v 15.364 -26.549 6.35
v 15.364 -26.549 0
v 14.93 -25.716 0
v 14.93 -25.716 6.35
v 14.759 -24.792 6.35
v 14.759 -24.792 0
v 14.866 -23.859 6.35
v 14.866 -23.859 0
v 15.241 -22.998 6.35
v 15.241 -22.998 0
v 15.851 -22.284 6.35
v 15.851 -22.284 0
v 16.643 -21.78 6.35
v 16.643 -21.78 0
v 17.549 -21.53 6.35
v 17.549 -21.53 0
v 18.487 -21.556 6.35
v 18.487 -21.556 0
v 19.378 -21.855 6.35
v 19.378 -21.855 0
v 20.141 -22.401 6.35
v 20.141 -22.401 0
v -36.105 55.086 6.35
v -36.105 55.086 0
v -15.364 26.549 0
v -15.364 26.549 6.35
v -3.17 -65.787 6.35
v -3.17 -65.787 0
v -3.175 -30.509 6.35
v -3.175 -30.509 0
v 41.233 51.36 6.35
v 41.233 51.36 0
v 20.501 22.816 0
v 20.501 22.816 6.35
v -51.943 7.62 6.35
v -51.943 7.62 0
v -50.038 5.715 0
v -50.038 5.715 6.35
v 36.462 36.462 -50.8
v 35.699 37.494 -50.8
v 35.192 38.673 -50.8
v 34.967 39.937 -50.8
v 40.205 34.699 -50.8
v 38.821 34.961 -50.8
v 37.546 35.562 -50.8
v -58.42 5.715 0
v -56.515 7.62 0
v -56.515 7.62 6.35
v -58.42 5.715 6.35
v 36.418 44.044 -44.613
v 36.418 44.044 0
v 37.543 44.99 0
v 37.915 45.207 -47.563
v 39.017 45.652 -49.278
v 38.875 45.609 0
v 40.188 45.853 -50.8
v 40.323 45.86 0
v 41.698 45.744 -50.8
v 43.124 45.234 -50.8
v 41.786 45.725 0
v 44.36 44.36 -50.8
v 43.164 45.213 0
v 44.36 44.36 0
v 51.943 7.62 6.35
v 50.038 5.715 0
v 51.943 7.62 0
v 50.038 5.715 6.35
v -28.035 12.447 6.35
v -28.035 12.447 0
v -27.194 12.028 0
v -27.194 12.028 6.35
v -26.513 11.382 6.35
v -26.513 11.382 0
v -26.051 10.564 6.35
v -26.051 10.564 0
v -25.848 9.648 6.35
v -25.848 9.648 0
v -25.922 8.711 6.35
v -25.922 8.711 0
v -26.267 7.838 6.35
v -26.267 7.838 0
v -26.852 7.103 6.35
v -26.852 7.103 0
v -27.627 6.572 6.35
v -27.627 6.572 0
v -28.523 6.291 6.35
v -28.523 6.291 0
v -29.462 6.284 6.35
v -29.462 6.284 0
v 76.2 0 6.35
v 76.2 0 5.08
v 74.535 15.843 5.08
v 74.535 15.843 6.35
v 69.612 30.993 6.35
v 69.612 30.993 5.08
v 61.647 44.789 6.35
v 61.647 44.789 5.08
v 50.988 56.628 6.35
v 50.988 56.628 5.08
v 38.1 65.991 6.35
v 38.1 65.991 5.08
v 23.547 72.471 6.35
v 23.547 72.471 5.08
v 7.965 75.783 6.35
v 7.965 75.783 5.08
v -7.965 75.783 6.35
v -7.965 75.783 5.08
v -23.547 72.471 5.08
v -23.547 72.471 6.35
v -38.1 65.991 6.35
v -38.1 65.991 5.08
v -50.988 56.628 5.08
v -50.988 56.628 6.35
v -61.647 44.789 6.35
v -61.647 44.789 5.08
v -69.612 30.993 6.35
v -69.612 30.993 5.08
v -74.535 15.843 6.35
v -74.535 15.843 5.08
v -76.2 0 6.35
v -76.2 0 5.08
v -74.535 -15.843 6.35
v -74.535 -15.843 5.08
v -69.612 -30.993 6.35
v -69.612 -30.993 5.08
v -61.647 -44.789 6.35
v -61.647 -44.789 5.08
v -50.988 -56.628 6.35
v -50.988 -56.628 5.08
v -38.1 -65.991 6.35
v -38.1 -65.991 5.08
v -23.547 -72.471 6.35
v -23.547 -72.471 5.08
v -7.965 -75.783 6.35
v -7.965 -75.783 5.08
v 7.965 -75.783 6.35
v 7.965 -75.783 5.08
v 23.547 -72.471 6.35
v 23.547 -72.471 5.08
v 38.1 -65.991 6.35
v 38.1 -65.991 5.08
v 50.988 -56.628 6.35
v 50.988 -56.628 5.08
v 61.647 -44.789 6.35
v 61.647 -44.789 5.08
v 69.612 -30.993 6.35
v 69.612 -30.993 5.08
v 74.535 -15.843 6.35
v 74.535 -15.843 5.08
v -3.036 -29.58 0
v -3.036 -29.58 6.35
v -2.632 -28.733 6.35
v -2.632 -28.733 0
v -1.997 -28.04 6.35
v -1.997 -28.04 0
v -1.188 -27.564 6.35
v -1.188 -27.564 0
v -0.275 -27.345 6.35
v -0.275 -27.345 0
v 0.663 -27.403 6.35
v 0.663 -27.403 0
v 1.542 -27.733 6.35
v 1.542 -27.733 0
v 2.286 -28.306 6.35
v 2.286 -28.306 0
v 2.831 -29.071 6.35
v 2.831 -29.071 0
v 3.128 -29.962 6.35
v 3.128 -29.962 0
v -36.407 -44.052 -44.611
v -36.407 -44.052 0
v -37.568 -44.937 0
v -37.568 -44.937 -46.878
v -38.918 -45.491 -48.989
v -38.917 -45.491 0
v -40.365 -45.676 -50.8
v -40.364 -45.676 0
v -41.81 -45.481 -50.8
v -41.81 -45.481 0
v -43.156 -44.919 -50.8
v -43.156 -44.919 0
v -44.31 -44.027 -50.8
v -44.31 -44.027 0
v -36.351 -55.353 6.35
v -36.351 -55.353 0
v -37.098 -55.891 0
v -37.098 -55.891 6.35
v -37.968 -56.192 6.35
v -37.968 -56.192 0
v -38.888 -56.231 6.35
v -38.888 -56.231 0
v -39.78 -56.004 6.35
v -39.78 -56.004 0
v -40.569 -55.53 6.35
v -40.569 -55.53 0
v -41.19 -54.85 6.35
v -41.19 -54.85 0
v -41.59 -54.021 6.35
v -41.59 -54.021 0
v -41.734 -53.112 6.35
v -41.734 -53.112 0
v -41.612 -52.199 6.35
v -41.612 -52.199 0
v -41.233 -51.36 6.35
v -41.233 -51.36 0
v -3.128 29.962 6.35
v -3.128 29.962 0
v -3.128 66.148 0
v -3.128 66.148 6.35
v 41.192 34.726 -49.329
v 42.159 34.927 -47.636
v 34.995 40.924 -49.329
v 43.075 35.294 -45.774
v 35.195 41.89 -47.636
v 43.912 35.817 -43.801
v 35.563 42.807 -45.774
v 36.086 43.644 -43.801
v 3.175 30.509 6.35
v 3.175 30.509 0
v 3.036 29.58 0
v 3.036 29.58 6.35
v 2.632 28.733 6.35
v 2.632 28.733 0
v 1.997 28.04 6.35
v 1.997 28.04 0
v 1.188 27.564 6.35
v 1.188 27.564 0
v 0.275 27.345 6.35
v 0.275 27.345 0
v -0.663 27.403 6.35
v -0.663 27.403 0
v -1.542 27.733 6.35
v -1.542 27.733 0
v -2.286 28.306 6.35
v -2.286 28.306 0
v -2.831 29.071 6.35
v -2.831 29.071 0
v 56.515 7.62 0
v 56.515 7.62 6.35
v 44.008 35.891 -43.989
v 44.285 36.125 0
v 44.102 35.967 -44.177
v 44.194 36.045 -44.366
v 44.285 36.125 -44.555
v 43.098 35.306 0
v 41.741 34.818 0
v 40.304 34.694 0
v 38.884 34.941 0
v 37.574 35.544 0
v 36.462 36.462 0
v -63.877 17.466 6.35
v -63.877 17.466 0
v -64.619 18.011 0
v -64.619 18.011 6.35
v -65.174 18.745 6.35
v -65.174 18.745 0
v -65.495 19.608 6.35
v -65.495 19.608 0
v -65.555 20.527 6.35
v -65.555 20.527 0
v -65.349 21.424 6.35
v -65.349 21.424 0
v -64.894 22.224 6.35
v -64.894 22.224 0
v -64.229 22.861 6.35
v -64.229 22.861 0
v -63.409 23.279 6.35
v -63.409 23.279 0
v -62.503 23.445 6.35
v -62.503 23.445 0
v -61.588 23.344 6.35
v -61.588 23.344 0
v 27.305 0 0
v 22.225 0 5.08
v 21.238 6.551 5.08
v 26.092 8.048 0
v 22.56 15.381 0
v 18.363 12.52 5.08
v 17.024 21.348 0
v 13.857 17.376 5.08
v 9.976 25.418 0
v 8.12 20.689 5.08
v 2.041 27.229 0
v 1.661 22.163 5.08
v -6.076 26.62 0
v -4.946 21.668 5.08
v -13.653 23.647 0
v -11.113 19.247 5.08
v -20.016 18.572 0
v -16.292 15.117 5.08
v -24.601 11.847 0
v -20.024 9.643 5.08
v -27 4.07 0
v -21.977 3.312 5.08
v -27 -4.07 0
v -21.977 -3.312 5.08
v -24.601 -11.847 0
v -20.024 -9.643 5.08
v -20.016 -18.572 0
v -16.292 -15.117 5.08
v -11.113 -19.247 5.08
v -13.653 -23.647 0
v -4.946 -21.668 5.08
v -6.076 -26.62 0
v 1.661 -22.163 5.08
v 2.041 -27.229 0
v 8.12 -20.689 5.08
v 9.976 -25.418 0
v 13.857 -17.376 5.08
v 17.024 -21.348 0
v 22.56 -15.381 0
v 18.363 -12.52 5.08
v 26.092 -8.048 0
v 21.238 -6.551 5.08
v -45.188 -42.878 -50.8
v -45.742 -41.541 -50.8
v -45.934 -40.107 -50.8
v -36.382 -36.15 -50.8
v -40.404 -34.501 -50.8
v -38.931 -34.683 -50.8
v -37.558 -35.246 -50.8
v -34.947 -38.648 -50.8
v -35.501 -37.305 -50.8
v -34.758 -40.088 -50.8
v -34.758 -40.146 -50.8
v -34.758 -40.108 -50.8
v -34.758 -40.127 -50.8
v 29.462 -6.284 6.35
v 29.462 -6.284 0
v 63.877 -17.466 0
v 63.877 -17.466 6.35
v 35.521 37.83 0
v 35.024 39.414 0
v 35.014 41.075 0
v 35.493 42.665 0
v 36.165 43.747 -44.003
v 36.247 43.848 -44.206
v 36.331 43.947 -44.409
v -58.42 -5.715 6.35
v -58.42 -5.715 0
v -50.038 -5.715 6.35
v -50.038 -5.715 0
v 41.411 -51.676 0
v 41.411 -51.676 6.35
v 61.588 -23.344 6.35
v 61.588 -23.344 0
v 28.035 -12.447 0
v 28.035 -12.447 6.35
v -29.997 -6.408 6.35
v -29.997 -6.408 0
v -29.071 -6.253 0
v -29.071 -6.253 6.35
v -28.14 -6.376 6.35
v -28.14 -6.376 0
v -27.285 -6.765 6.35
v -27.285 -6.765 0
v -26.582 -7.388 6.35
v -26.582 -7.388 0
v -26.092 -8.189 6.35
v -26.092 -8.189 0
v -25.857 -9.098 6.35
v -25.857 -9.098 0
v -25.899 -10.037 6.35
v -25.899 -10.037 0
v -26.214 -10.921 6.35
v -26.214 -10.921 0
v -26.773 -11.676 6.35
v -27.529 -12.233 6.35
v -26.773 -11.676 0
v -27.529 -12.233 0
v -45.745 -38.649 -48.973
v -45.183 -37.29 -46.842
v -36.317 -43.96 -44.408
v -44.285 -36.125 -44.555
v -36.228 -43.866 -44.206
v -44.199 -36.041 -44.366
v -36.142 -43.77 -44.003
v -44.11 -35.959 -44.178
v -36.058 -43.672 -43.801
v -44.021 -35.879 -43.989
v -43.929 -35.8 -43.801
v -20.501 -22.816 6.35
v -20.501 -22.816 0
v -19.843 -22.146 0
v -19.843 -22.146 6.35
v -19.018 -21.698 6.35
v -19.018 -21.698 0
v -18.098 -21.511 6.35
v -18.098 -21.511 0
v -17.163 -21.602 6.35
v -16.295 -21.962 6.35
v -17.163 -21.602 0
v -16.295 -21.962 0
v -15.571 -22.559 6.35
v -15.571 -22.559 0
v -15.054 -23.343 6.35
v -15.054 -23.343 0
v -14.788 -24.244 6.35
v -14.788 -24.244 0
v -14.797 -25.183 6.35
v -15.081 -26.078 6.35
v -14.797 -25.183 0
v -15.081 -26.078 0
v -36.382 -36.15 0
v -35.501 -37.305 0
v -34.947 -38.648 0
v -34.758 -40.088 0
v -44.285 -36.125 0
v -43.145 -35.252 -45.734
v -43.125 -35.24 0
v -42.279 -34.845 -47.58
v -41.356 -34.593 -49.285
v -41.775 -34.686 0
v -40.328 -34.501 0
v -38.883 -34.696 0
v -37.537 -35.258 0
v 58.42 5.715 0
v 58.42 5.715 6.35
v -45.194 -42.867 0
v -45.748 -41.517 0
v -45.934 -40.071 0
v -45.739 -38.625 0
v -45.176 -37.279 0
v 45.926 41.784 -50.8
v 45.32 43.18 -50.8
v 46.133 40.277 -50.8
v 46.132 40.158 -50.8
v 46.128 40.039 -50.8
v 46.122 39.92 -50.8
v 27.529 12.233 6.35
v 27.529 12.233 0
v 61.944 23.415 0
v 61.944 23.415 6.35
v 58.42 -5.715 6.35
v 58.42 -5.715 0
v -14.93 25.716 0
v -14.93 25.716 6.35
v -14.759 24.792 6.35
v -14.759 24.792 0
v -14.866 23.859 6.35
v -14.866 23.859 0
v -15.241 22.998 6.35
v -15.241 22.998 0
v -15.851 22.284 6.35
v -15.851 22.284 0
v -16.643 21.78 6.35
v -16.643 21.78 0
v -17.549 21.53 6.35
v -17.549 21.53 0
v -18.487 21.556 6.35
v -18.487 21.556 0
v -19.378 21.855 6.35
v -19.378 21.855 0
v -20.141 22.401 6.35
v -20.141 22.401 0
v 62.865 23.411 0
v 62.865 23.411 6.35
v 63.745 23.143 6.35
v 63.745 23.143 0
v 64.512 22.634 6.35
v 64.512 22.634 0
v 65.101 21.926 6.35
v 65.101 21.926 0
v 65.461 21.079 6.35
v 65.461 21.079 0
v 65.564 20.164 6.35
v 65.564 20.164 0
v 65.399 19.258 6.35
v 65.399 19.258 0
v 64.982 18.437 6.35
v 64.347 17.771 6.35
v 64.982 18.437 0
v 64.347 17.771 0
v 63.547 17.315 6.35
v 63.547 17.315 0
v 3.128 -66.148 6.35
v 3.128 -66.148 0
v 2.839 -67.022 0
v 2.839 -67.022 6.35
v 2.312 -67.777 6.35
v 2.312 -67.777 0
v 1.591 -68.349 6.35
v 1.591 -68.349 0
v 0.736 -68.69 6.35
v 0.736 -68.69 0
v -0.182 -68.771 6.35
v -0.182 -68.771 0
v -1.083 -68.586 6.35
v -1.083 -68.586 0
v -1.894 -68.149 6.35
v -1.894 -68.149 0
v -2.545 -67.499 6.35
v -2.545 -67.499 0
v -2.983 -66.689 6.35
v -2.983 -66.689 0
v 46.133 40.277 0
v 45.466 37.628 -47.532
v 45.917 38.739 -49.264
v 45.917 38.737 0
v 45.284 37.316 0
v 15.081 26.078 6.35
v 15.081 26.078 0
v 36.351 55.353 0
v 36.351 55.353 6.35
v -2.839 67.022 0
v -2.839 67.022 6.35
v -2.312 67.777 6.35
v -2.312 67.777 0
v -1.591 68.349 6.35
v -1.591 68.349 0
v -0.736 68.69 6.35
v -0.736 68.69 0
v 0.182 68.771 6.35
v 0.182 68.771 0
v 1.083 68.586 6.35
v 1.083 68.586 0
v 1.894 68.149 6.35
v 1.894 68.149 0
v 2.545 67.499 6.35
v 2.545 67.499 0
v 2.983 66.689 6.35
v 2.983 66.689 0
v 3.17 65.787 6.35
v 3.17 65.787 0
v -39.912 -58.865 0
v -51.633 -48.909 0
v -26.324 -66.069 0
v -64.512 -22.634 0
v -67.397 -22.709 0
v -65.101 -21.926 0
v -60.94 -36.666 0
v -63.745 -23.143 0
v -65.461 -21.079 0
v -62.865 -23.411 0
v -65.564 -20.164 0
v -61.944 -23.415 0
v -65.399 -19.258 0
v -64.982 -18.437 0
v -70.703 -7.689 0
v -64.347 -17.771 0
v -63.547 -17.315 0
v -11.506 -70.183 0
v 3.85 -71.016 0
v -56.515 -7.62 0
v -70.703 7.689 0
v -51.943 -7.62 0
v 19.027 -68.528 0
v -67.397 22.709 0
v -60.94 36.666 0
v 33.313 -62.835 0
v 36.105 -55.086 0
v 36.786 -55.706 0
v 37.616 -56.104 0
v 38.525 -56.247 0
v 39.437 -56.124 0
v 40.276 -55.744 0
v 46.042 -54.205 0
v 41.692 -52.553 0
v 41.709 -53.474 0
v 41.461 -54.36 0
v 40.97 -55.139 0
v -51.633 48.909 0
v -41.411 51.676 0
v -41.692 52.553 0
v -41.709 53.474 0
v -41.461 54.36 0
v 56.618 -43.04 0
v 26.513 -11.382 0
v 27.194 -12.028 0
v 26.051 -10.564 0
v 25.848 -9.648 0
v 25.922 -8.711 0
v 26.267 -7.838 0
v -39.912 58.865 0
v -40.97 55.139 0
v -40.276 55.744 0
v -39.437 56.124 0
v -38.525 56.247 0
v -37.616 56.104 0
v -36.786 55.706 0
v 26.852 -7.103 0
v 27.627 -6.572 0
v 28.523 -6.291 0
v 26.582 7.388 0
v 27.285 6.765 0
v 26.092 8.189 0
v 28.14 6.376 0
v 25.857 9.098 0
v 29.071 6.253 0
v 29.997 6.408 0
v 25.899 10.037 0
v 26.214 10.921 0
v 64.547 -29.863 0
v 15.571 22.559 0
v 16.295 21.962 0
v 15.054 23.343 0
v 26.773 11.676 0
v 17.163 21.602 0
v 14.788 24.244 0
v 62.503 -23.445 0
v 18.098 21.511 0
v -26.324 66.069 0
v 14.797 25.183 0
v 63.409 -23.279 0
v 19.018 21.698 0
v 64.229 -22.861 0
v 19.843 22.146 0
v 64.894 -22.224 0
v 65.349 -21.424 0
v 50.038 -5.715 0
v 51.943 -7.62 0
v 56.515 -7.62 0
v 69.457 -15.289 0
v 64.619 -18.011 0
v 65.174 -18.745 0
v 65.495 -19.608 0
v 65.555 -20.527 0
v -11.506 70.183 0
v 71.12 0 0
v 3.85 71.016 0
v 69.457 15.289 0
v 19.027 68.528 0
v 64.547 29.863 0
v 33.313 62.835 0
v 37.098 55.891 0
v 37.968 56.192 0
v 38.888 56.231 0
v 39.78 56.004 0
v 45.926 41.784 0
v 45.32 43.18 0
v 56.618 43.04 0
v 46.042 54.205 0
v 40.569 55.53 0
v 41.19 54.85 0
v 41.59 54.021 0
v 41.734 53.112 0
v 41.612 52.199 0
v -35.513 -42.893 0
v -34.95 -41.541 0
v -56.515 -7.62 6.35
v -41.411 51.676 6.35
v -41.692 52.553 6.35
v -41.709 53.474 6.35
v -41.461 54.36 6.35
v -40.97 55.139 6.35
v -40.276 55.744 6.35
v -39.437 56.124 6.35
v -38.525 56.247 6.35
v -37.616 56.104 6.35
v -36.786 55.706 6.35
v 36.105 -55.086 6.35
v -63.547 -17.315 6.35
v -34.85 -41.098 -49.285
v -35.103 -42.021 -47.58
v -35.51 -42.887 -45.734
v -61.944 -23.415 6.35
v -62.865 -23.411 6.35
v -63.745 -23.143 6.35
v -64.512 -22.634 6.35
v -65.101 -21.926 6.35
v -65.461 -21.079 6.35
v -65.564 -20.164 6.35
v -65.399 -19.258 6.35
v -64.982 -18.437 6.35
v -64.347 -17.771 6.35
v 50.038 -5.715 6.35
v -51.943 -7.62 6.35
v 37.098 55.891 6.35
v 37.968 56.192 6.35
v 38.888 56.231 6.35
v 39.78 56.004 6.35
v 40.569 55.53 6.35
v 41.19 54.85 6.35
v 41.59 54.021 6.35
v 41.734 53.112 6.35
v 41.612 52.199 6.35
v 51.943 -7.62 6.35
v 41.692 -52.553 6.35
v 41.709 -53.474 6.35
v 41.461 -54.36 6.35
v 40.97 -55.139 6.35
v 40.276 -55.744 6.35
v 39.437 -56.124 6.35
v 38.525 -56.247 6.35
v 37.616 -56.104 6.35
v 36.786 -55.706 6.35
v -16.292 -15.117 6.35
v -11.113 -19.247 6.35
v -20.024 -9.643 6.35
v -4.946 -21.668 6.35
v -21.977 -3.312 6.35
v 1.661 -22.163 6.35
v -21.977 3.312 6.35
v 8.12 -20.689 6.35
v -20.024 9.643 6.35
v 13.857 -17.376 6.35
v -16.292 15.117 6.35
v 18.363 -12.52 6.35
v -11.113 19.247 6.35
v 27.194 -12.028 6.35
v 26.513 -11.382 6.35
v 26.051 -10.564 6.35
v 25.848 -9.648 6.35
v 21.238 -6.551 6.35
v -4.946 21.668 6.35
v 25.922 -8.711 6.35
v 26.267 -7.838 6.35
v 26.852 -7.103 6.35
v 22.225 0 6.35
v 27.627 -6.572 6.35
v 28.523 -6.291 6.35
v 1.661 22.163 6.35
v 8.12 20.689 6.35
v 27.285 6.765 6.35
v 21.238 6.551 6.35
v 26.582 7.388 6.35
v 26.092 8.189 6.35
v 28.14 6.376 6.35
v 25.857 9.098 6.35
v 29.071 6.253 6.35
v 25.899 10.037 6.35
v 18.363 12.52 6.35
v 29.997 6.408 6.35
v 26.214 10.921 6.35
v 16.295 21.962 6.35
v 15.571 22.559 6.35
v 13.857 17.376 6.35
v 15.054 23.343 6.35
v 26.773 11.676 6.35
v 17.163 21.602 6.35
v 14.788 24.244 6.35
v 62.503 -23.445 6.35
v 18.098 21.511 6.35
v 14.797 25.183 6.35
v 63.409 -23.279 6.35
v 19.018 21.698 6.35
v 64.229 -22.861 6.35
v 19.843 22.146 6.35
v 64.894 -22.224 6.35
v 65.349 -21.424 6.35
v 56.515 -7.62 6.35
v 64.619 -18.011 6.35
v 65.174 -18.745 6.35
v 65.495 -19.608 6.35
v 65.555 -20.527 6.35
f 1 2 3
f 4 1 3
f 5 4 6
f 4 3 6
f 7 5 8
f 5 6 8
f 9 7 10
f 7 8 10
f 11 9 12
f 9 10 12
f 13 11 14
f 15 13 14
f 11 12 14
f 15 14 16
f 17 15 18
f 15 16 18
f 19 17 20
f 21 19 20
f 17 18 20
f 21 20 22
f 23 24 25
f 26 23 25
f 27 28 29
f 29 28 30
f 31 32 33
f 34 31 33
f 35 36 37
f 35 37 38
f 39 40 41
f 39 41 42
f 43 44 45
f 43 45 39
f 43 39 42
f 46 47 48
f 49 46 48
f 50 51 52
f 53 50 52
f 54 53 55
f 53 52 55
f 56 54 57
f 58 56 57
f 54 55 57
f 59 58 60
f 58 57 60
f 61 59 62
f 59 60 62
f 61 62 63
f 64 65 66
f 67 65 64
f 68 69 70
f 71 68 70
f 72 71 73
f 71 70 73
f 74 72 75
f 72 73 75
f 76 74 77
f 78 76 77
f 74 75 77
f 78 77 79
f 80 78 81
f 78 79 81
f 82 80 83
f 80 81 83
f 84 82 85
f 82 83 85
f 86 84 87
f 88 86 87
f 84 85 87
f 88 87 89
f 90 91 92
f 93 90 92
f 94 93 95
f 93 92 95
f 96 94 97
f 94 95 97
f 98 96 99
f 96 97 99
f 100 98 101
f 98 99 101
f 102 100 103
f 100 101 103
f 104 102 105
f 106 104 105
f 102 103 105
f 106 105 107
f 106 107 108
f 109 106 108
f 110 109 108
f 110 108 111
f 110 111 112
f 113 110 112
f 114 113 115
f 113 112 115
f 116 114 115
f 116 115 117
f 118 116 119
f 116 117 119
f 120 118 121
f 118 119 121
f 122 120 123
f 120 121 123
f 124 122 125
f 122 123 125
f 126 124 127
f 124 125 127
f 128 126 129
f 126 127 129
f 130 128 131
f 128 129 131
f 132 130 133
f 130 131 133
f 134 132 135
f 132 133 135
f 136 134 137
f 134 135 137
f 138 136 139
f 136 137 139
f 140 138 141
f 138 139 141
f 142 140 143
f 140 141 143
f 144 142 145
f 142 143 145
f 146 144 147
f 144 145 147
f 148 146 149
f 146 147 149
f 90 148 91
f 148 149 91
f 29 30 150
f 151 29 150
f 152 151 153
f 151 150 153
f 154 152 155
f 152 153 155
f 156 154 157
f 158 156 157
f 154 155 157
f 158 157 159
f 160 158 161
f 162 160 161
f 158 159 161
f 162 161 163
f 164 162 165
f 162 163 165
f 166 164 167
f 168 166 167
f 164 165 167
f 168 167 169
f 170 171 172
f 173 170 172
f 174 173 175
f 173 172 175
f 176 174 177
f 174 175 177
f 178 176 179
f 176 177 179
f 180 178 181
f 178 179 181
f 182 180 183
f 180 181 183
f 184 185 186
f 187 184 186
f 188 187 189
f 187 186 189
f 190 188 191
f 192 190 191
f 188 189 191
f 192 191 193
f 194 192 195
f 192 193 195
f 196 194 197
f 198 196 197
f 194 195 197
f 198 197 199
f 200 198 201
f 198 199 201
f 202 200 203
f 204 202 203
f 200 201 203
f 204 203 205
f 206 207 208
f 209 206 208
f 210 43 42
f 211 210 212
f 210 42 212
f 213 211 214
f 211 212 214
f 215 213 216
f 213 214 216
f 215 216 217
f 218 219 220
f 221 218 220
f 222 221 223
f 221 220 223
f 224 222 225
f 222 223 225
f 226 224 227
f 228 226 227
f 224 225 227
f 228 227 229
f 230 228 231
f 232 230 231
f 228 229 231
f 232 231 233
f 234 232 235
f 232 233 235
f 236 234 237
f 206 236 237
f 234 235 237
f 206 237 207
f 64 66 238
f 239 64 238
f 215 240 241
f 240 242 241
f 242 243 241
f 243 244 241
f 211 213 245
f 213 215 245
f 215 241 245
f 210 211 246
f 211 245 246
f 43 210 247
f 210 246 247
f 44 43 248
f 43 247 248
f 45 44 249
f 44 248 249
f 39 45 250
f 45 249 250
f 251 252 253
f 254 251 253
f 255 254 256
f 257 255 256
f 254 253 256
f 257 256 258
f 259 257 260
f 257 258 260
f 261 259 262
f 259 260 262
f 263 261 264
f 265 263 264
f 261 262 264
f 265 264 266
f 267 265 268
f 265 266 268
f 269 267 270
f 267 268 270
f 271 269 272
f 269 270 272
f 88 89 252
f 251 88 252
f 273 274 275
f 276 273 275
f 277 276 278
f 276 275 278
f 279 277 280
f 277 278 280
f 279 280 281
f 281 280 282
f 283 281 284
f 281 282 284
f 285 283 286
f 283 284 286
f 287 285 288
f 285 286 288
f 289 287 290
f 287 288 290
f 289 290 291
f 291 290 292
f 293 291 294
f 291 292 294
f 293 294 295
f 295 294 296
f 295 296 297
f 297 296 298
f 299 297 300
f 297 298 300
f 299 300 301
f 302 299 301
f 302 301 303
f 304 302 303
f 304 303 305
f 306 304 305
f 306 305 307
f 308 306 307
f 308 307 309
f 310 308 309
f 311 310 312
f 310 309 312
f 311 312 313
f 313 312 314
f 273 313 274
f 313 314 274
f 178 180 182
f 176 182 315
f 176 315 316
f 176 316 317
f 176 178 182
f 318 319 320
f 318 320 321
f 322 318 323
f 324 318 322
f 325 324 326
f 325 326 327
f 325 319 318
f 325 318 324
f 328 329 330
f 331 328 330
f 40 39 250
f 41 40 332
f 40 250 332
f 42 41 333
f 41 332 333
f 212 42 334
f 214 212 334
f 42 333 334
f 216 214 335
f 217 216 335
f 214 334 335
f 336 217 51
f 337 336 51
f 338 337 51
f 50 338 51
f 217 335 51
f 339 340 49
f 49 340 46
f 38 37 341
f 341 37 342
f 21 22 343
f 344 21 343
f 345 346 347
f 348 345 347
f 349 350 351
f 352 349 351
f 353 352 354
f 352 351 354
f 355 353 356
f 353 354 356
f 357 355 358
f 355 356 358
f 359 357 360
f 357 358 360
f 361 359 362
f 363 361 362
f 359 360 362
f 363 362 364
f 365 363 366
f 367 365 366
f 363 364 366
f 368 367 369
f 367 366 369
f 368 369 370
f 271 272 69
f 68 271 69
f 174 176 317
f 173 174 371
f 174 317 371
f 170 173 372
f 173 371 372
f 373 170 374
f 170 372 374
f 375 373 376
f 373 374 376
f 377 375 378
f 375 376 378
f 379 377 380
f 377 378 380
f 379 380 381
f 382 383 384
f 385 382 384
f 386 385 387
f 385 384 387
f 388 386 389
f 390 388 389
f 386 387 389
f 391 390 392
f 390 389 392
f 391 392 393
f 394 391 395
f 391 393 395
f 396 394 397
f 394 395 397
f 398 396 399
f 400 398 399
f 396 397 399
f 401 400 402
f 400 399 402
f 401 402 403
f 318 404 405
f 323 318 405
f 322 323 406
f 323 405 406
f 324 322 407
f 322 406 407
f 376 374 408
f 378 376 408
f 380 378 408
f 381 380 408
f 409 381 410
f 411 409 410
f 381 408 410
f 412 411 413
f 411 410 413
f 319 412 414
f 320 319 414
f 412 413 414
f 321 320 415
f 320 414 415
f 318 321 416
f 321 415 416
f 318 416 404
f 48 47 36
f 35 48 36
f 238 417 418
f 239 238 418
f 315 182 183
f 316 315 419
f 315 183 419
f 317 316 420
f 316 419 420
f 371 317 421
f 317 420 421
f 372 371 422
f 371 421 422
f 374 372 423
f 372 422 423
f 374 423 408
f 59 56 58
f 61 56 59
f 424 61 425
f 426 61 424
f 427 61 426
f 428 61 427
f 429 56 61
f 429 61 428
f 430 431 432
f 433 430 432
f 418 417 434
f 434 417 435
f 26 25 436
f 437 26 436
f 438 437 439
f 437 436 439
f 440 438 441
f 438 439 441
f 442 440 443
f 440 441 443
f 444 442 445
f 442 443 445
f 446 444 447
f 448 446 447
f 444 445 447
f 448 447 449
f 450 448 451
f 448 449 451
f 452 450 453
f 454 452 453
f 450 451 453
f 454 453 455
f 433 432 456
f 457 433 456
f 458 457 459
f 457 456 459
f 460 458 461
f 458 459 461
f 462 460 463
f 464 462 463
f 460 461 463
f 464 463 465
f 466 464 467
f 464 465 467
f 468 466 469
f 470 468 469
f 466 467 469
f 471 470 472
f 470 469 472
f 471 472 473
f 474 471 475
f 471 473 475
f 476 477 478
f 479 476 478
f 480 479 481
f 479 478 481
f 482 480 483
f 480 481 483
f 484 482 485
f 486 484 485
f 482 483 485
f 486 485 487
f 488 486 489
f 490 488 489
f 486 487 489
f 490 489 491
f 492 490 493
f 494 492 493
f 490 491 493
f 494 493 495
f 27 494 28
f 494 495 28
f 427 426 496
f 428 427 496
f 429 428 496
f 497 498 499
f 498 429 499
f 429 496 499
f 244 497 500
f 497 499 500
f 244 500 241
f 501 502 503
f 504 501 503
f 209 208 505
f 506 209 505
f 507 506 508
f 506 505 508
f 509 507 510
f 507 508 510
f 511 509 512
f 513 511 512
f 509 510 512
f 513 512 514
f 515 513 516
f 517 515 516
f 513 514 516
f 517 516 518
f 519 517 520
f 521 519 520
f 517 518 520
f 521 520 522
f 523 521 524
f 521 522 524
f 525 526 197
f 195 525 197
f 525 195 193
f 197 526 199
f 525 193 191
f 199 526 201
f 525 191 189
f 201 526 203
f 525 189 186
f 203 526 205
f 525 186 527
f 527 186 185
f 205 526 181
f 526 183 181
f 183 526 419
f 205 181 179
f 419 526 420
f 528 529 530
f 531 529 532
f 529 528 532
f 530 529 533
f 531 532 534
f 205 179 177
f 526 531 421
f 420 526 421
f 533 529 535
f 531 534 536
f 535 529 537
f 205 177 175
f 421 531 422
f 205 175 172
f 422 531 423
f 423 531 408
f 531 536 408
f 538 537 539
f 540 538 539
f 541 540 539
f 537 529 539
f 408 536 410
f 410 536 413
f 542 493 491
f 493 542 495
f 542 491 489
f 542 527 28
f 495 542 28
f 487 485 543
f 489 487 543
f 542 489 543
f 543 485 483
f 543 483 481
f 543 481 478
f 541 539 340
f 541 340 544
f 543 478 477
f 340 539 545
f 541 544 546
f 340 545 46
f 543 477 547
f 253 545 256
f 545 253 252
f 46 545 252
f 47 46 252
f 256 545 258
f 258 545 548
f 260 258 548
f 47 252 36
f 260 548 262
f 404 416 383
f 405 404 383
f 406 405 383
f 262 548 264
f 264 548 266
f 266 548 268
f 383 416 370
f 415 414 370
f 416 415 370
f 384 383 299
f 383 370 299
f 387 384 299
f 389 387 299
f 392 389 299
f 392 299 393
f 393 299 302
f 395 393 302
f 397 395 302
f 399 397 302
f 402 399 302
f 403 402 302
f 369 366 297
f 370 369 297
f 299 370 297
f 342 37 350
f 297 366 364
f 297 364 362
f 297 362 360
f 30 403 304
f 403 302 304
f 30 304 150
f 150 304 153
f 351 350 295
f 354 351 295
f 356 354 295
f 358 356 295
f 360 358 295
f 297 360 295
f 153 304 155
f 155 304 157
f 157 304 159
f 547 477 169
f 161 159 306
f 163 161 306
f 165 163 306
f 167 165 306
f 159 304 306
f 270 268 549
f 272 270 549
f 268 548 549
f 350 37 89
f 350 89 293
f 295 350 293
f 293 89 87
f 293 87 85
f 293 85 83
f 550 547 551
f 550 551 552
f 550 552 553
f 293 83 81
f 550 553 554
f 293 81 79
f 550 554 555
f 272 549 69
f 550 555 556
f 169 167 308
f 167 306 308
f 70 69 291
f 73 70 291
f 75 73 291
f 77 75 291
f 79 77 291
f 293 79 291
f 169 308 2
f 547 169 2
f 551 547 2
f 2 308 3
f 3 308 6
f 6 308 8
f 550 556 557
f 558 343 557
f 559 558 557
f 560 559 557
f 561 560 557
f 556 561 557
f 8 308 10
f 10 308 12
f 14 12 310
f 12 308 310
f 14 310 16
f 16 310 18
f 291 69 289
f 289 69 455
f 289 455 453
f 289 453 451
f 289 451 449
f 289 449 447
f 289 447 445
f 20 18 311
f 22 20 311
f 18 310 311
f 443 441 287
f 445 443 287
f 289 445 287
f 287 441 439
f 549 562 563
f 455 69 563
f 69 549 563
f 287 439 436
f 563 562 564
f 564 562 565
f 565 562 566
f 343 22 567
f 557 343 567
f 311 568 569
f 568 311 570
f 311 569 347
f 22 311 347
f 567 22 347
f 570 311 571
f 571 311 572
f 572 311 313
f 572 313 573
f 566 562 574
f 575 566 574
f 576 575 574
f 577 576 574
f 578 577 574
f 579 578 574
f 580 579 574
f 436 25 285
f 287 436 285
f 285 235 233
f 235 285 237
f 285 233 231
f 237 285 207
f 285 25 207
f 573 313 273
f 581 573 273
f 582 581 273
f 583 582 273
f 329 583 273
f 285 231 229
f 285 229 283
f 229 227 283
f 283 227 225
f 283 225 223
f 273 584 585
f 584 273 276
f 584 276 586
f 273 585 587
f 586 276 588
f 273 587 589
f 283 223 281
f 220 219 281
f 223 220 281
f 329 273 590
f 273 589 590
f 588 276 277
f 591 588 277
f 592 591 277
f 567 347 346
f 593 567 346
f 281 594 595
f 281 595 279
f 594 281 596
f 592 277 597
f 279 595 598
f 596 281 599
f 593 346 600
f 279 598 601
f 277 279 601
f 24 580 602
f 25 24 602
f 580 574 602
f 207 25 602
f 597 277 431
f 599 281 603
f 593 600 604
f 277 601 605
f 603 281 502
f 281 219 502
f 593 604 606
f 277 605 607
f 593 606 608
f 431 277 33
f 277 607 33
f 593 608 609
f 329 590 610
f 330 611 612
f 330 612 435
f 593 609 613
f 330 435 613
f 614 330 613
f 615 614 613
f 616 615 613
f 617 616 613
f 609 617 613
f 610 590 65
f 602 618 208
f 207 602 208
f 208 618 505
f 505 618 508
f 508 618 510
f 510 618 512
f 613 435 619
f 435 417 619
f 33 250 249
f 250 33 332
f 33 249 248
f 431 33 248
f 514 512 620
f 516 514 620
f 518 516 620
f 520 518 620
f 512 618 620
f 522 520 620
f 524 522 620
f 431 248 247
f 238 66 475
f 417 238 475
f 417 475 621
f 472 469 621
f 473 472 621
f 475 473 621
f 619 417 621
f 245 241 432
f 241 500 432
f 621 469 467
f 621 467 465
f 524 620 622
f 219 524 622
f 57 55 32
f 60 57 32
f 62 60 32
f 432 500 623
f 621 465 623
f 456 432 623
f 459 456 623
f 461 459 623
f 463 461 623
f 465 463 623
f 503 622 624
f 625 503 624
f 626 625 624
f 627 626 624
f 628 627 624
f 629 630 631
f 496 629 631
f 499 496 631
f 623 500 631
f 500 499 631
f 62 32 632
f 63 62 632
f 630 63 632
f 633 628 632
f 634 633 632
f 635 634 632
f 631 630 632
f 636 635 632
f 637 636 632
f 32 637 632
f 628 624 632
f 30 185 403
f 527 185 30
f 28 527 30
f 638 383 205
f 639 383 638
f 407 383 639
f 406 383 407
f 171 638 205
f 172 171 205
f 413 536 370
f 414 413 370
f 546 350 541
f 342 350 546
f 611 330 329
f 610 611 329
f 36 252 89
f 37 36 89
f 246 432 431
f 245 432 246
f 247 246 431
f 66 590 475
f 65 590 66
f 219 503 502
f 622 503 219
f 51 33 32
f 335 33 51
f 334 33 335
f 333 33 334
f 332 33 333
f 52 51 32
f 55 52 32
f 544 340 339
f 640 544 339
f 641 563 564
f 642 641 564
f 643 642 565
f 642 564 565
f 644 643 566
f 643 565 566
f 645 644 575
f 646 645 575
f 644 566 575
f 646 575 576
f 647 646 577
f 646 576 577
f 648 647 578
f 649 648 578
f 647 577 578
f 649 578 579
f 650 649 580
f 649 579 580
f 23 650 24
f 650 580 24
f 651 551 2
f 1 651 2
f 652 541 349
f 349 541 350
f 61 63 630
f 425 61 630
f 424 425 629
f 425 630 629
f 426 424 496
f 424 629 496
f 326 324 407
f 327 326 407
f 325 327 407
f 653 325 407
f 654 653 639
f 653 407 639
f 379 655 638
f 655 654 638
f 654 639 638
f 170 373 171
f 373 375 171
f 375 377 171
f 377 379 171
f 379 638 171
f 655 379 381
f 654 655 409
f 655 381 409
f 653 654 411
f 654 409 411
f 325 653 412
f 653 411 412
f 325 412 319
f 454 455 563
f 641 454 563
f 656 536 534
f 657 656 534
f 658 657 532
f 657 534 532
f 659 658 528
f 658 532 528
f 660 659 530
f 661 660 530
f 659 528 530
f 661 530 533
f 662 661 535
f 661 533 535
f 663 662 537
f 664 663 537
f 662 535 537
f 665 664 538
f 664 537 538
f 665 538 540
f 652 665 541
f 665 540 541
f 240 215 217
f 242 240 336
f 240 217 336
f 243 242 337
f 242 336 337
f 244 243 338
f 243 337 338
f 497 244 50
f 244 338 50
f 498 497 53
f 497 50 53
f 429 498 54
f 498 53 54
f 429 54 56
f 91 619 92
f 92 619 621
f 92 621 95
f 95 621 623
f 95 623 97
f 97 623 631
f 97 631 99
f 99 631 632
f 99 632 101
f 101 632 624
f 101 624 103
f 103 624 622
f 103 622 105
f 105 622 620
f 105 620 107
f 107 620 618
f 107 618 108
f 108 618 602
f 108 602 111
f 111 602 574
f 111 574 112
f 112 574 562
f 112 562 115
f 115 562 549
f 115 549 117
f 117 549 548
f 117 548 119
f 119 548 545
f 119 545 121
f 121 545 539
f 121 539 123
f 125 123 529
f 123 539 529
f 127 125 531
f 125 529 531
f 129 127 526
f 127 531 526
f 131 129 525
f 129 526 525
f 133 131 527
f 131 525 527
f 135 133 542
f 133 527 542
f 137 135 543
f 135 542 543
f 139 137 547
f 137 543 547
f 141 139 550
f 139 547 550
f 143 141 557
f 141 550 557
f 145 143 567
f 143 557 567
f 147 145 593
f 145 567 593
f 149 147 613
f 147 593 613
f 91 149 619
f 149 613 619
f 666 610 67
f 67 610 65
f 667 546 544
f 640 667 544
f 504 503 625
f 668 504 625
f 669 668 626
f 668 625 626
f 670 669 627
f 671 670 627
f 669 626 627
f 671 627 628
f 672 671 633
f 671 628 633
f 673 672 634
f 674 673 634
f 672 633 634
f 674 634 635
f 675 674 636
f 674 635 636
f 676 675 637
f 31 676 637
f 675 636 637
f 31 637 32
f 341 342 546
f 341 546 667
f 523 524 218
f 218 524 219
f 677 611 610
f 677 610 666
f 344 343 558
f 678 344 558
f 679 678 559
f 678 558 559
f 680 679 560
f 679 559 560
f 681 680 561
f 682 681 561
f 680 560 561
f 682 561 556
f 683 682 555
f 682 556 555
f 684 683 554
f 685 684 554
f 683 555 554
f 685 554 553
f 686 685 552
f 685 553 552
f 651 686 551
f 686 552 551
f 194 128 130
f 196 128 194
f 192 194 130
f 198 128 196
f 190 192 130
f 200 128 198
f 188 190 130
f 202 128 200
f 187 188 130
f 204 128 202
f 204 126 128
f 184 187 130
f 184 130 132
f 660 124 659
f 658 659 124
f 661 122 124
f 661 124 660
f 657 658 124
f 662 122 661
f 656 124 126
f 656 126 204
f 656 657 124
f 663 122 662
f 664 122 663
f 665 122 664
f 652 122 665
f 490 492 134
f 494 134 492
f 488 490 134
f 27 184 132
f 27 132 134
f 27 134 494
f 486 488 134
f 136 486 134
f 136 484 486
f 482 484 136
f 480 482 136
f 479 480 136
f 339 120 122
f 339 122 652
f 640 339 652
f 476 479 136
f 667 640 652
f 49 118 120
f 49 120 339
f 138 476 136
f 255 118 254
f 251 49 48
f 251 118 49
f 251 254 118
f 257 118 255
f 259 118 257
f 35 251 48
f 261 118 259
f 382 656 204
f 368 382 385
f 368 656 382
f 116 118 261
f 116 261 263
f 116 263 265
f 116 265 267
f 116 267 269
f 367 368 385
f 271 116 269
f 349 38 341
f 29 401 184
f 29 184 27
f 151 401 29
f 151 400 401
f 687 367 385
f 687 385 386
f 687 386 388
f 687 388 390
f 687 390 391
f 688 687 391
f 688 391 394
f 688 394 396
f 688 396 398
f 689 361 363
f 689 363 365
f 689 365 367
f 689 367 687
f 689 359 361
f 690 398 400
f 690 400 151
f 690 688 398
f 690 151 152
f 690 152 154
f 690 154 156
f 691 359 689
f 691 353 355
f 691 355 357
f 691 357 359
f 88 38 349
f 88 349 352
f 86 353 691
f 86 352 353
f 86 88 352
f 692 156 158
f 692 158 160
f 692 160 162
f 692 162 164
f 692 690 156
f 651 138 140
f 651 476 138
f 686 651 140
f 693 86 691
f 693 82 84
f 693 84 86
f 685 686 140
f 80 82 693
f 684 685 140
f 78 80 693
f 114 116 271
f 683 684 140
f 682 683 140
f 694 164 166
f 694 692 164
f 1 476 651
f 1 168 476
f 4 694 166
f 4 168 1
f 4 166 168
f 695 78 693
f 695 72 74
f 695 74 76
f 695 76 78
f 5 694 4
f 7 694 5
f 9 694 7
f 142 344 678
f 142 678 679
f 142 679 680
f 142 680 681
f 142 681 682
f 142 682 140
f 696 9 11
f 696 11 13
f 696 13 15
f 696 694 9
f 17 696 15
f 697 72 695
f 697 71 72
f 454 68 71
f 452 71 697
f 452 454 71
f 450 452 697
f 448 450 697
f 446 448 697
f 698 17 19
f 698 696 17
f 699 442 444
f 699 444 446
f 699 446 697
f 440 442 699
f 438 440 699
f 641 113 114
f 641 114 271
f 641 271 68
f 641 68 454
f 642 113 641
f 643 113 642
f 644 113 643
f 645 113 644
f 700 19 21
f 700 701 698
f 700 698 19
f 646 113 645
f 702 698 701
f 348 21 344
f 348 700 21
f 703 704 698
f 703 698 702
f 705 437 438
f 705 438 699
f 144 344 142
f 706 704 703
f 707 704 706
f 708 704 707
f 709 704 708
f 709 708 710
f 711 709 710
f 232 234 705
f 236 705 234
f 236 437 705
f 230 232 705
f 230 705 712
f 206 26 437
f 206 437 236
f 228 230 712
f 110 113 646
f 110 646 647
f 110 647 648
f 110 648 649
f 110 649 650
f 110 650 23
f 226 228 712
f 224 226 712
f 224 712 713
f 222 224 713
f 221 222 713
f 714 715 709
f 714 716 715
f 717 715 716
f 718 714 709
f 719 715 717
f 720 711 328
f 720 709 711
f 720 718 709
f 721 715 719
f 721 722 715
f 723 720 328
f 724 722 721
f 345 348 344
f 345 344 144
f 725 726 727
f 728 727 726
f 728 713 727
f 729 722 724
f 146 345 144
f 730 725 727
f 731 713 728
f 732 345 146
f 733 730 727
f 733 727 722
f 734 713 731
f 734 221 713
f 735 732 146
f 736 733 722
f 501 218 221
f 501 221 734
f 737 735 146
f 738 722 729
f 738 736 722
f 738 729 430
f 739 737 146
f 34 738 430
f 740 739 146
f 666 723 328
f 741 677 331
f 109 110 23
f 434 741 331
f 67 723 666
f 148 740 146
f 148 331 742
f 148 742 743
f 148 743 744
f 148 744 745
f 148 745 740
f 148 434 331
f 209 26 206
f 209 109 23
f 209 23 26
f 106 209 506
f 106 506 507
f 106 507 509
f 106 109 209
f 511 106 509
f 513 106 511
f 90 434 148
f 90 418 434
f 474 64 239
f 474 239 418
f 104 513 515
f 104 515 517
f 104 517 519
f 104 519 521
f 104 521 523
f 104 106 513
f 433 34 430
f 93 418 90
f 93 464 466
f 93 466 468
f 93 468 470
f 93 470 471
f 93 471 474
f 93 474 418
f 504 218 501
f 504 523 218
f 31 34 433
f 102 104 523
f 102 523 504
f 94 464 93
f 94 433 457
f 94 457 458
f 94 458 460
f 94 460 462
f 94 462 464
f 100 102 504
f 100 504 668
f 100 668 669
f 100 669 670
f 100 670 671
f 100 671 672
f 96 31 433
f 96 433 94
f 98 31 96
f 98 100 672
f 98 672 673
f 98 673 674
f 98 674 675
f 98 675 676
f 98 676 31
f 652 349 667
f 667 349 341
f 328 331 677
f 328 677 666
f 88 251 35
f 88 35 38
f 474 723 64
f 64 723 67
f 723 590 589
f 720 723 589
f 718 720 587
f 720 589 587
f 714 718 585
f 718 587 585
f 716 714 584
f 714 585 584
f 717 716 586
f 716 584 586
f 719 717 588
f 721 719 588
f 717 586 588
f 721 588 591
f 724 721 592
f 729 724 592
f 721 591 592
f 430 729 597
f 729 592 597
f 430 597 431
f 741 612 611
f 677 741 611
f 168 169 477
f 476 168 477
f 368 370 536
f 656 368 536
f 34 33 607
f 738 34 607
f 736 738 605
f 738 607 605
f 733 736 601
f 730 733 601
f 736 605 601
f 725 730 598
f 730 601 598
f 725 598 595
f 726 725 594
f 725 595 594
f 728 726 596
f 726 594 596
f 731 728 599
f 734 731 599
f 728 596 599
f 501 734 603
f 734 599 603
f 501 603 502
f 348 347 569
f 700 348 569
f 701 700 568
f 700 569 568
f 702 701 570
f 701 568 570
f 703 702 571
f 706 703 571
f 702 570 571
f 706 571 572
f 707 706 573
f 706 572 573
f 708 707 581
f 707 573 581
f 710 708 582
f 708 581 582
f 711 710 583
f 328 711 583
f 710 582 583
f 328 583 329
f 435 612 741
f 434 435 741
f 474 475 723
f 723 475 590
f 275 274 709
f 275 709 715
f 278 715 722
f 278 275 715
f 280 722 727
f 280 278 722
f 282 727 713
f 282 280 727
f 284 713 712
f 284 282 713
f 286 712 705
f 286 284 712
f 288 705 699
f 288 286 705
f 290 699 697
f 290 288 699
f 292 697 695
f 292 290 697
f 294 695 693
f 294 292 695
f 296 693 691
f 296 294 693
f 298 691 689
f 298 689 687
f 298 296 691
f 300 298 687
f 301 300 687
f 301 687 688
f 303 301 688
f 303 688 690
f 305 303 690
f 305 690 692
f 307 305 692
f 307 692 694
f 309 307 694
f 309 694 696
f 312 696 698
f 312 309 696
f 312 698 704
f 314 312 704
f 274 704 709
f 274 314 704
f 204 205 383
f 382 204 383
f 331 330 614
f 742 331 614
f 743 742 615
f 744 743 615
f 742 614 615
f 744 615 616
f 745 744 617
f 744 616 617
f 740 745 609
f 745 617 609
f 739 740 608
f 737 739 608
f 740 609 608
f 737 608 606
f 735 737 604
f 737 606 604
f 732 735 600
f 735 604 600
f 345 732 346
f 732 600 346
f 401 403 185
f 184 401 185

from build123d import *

# Parameters (mm, degrees)
F0_R          = 22.225
F1_DEPTH      = 6.35
F2_SIZE       = 1.905
F4_DEPTH      = 50.8
F8_DEPTH      = 25.4
F8_DEPTH_BACK = 25.4
F9_SIZE       = 5.08
F10_SIZE      = 5.08


with BuildPart() as f1:
    # F0 (on Top) → F1 (new body)
    with BuildSketch(Plane.XY):
        with BuildLine():
            ThreePointArc((-76.2, 0), (0, -76.2), (76.2, 0))
            ThreePointArc((76.2, 0), (0, 76.2), (-76.2, 0))
        make_face()
        with BuildLine():
            ThreePointArc((-36.3505191374, -55.3531540115), (-40.5694607495, -55.5302656455), (-41.2330473061, -51.3600750337))
            Line((-41.2330473061, -51.3600750337), (-20.5013866713, -22.8161053906))
            ThreePointArc((-20.5013866713, -22.8161053906), (-16.2954133846, -21.961508124), (-15.0808678012, -26.0779904576))
            Line((-15.0808678012, -26.0779904576), (-36.3505191374, -55.3531540115))
        make_face(mode=Mode.SUBTRACT)
        with BuildLine():
            ThreePointArc((3.1275798593, -66.1479413497), (-0.1815119967, -68.7710593314), (-3.1695413391, -65.7873506482))
            Line((-3.1695413391, -65.7873506482), (-3.174999962, -30.5090297434))
            ThreePointArc((-3.174999962, -30.5090297434), (-0.2746157651, -27.3454369619), (3.1275798593, -29.9618491446))
            Line((3.1275798593, -29.9618491446), (3.1275798593, -66.1479413497))
        make_face(mode=Mode.SUBTRACT)
        with BuildLine():
            ThreePointArc((-61.9439553323, -23.4153432254), (-65.4612544013, -21.0787978873), (-63.546930662, -17.314996421))
            Line((-63.546930662, -17.314996421), (-29.9969404887, -6.4082042695))
            ThreePointArc((-29.9969404887, -6.4082042695), (-26.0919169519, -8.189029627), (-27.5289365415, -12.233225774))
            Line((-27.5289365415, -12.233225774), (-61.9439553323, -23.4153432254))
        make_face(mode=Mode.SUBTRACT)
        with BuildLine():
            ThreePointArc((41.4110496523, -51.6764633782), (40.2757681695, -55.743645795), (36.1046216907, -55.086094345))
            Line((36.1046216907, -55.086094345), (15.3641288185, -26.548541698))
            ThreePointArc((15.3641288185, -26.548541698), (15.8510757428, -22.2843383176), (20.1413983161, -22.4012998243))
            Line((20.1413983161, -22.4012998243), (41.4110496523, -51.6764633782))
        make_face(mode=Mode.SUBTRACT)
        with BuildLine():
            ThreePointArc((63.8769059879, -17.4663328146), (65.349073818, -21.4240542218), (61.5880463856, -23.3438223094))
            Line((61.5880463856, -23.3438223094), (28.0346825979, -12.4474130757))
            ThreePointArc((28.0346825979, -12.4474130757), (25.9221950752, -8.7113798527), (29.4618871971, -6.2842153632))
            Line((29.4618871971, -6.2842153632), (63.8769059879, -17.4663328146))
        make_face(mode=Mode.SUBTRACT)
        Polygon((-58.42, -7.62), (-58.42, 0), (-58.42, 7.62), (-50.038, 7.62), (-50.038, -7.62), align=None, mode=Mode.SUBTRACT)
        with BuildLine():
            ThreePointArc((-63.8769059879, 17.4663328146), (-65.349073818, 21.4240542218), (-61.5880463856, 23.3438223094))
            Line((-61.5880463856, 23.3438223094), (-28.0346825979, 12.4474130757))
            ThreePointArc((-28.0346825979, 12.4474130757), (-25.9221950752, 8.7113798527), (-29.4618871971, 6.2842153632))
            Line((-29.4618871971, 6.2842153632), (-63.8769059879, 17.4663328146))
        make_face(mode=Mode.SUBTRACT)
        with BuildLine():
            ThreePointArc((-41.4110496523, 51.6764633782), (-40.2757681695, 55.743645795), (-36.1046216907, 55.086094345))
            Line((-36.1046216907, 55.086094345), (-15.3641288185, 26.548541698))
            ThreePointArc((-15.3641288185, 26.548541698), (-15.8510757428, 22.2843383176), (-20.1413983161, 22.4012998243))
            Line((-20.1413983161, 22.4012998243), (-41.4110496523, 51.6764633782))
        make_face(mode=Mode.SUBTRACT)
        Circle(F0_R, mode=Mode.SUBTRACT)
        Polygon((58.42, 7.62), (58.42, 0), (58.42, -7.62), (50.038, -7.62), (50.038, 7.62), align=None, mode=Mode.SUBTRACT)
        with BuildLine():
            ThreePointArc((61.9439553323, 23.4153432254), (65.4612544013, 21.0787978873), (63.546930662, 17.314996421))
            Line((63.546930662, 17.314996421), (29.9969404887, 6.4082042695))
            ThreePointArc((29.9969404887, 6.4082042695), (26.0919169519, 8.189029627), (27.5289365415, 12.233225774))
            Line((27.5289365415, 12.233225774), (61.9439553323, 23.4153432254))
        make_face(mode=Mode.SUBTRACT)
        with BuildLine():
            ThreePointArc((3.174999962, 30.5090297434), (0.2746157651, 27.3454369619), (-3.1275798593, 29.9618491446))
            Line((-3.1275798593, 29.9618491446), (-3.1275798593, 66.1479413497))
            ThreePointArc((-3.1275798593, 66.1479413497), (0.1815119967, 68.7710593314), (3.1695413391, 65.7873506482))
            Line((3.1695413391, 65.7873506482), (3.174999962, 30.5090297434))
        make_face(mode=Mode.SUBTRACT)
        with BuildLine():
            ThreePointArc((36.3505191374, 55.3531540115), (40.5694607495, 55.5302656455), (41.2330473061, 51.3600750337))
            Line((41.2330473061, 51.3600750337), (20.5013866713, 22.8161053906))
            ThreePointArc((20.5013866713, 22.8161053906), (16.2954133846, 21.961508124), (15.0808678012, 26.0779904576))
            Line((15.0808678012, 26.0779904576), (36.3505191374, 55.3531540115))
        make_face(mode=Mode.SUBTRACT)
    extrude(amount=F1_DEPTH)

    # F2
    f2_edges = [f1.edges().sort_by_distance(p)[0] for p in [
        (58.42, 7.62, 3.175),
        (50.038, 7.62, 3.175),
        (58.42, -7.62, 3.175),
        (50.038, -7.62, 3.175),
        (-50.038, 7.62, 3.175),
        (-58.42, 7.62, 3.175),
        (-50.038, -7.62, 3.175),
        (-58.42, -7.62, 3.175),
    ]]
    chamfer(f2_edges, length=F2_SIZE)

    # F3 (on face) → F4 (join)
    with BuildSketch(Plane(origin=(0, 0, 0), x_dir=(1, 0, 0), z_dir=(0, 0, -1))):
        with BuildLine():
            ThreePointArc((-36.407482317, 44.0524429667), (-40.3640168655, 45.6764662753), (-44.310067169, 44.0271317603))
            Line((-44.310067169, 44.0271317603), (-40.5403775713, 40.2815129604))
            ThreePointArc((-40.5403775713, 40.2815129604), (-38.5201020718, 42.2175820764), (-36.407482317, 44.0524429667))
        make_face()
        with BuildLine():
            Line((-40.5403775713, 40.2815129604), (-36.3821711106, 36.1498581148))
            ThreePointArc((-36.3821711106, 36.1498581148), (-35.1800623463, 37.9583303415), (-34.7581191398, 40.0884949375))
            ThreePointArc((-34.7581191398, 40.0884949375), (-35.1869115182, 42.2351948973), (-36.407482317, 44.0524429667))
            ThreePointArc((-36.407482317, 44.0524429667), (-38.5201020718, 42.2175820764), (-40.5403775713, 40.2815129604))
        make_face()
        with BuildLine():
            Line((40.4111525448, -40.4111525448), (36.4618960058, -36.4618960058))
            ThreePointArc((36.4618960058, -36.4618960058), (34.9572040364, -40.2442749258), (36.4178321079, -44.0438872554))
            ThreePointArc((36.4178321079, -44.0438872554), (38.457410353, -42.2746979757), (40.4111525448, -40.4111525448))
        make_face()
        with BuildLine():
            ThreePointArc((36.4178321079, -44.0438872554), (40.3228976199, -45.8603299081), (44.359963556, -44.359963556))
            Line((44.359963556, -44.359963556), (40.4111525448, -40.4111525448))
            ThreePointArc((40.4111525448, -40.4111525448), (38.457410353, -42.2746979757), (36.4178321079, -44.0438872554))
        make_face()
        with BuildLine():
            ThreePointArc((-44.2847559626, 36.1245469084), (-40.3282214141, 34.5005235998), (-36.3821711106, 36.1498581148))
            Line((-36.3821711106, 36.1498581148), (-40.5403775713, 40.2815129604))
            ThreePointArc((-40.5403775713, 40.2815129604), (-42.4634656081, 38.248876958), (-44.2847559626, 36.1245469084))
        make_face()
        with BuildLine():
            Line((-40.5403775713, 40.2815129604), (-44.310067169, 44.0271317603))
            ThreePointArc((-44.310067169, 44.0271317603), (-45.9340904775, 40.0705972119), (-44.2847559626, 36.1245469084))
            ThreePointArc((-44.2847559626, 36.1245469084), (-42.4634656081, 38.248876958), (-40.5403775713, 40.2815129604))
        make_face()
        with BuildLine():
            ThreePointArc((46.1331096706, -40.2767498912), (45.6501506831, -38.004240208), (44.2847559626, -36.1245469084))
            ThreePointArc((44.2847559626, -36.1245469084), (42.4021576862, -38.3168308131), (40.4111525448, -40.4111525448))
            Line((40.4111525448, -40.4111525448), (44.359963556, -44.359963556))
            ThreePointArc((44.359963556, -44.359963556), (45.6706900042, -42.5025464327), (46.1331096706, -40.2767498912))
        make_face()
        with BuildLine():
            ThreePointArc((40.4111525448, -40.4111525448), (42.4021576862, -38.3168308131), (44.2847559626, -36.1245469084))
            ThreePointArc((44.2847559626, -36.1245469084), (40.3043593055, -34.6939384792), (36.4618960058, -36.4618960058))
            Line((36.4618960058, -36.4618960058), (40.4111525448, -40.4111525448))
        make_face()
    extrude(amount=F4_DEPTH)

    # F7 (on face) → F8 (cut, two sides)
    with BuildSketch(Plane(origin=(0, 0, 0), x_dir=(-0.7071067812, -0.7071067812, 0), z_dir=(-0.7071067812, 0.7071067812, 0))) as f8_sk:
        Polygon((62.0108805597, -54.0438257158), (62.0108805597, -52.6354536414), (56.3773885369, -43.801125139), (51.3840802014, -54.0438257158), align=None)
        Polygon((-51.3840802014, -54.0438257158), (-56.3773885369, -43.801125139), (-62.0108805597, -52.6354536414), (-62.0108805597, -54.0438257158), align=None)
    extrude(amount=-F8_DEPTH, mode=Mode.SUBTRACT)
    extrude(f8_sk.sketch, amount=F8_DEPTH_BACK, mode=Mode.SUBTRACT)

    # F9
    f9_edges = [f1.edges().sort_by_distance(p)[0] for p in [
        (-76.2, 0, 0),
    ]]
    chamfer(f9_edges, length=F9_SIZE)

    # F10
    f10_edges = [f1.edges().sort_by_distance(p)[0] for p in [
        (-22.225, 0, 0),
    ]]
    chamfer(f10_edges, length=F10_SIZE)


solid = f1.part
